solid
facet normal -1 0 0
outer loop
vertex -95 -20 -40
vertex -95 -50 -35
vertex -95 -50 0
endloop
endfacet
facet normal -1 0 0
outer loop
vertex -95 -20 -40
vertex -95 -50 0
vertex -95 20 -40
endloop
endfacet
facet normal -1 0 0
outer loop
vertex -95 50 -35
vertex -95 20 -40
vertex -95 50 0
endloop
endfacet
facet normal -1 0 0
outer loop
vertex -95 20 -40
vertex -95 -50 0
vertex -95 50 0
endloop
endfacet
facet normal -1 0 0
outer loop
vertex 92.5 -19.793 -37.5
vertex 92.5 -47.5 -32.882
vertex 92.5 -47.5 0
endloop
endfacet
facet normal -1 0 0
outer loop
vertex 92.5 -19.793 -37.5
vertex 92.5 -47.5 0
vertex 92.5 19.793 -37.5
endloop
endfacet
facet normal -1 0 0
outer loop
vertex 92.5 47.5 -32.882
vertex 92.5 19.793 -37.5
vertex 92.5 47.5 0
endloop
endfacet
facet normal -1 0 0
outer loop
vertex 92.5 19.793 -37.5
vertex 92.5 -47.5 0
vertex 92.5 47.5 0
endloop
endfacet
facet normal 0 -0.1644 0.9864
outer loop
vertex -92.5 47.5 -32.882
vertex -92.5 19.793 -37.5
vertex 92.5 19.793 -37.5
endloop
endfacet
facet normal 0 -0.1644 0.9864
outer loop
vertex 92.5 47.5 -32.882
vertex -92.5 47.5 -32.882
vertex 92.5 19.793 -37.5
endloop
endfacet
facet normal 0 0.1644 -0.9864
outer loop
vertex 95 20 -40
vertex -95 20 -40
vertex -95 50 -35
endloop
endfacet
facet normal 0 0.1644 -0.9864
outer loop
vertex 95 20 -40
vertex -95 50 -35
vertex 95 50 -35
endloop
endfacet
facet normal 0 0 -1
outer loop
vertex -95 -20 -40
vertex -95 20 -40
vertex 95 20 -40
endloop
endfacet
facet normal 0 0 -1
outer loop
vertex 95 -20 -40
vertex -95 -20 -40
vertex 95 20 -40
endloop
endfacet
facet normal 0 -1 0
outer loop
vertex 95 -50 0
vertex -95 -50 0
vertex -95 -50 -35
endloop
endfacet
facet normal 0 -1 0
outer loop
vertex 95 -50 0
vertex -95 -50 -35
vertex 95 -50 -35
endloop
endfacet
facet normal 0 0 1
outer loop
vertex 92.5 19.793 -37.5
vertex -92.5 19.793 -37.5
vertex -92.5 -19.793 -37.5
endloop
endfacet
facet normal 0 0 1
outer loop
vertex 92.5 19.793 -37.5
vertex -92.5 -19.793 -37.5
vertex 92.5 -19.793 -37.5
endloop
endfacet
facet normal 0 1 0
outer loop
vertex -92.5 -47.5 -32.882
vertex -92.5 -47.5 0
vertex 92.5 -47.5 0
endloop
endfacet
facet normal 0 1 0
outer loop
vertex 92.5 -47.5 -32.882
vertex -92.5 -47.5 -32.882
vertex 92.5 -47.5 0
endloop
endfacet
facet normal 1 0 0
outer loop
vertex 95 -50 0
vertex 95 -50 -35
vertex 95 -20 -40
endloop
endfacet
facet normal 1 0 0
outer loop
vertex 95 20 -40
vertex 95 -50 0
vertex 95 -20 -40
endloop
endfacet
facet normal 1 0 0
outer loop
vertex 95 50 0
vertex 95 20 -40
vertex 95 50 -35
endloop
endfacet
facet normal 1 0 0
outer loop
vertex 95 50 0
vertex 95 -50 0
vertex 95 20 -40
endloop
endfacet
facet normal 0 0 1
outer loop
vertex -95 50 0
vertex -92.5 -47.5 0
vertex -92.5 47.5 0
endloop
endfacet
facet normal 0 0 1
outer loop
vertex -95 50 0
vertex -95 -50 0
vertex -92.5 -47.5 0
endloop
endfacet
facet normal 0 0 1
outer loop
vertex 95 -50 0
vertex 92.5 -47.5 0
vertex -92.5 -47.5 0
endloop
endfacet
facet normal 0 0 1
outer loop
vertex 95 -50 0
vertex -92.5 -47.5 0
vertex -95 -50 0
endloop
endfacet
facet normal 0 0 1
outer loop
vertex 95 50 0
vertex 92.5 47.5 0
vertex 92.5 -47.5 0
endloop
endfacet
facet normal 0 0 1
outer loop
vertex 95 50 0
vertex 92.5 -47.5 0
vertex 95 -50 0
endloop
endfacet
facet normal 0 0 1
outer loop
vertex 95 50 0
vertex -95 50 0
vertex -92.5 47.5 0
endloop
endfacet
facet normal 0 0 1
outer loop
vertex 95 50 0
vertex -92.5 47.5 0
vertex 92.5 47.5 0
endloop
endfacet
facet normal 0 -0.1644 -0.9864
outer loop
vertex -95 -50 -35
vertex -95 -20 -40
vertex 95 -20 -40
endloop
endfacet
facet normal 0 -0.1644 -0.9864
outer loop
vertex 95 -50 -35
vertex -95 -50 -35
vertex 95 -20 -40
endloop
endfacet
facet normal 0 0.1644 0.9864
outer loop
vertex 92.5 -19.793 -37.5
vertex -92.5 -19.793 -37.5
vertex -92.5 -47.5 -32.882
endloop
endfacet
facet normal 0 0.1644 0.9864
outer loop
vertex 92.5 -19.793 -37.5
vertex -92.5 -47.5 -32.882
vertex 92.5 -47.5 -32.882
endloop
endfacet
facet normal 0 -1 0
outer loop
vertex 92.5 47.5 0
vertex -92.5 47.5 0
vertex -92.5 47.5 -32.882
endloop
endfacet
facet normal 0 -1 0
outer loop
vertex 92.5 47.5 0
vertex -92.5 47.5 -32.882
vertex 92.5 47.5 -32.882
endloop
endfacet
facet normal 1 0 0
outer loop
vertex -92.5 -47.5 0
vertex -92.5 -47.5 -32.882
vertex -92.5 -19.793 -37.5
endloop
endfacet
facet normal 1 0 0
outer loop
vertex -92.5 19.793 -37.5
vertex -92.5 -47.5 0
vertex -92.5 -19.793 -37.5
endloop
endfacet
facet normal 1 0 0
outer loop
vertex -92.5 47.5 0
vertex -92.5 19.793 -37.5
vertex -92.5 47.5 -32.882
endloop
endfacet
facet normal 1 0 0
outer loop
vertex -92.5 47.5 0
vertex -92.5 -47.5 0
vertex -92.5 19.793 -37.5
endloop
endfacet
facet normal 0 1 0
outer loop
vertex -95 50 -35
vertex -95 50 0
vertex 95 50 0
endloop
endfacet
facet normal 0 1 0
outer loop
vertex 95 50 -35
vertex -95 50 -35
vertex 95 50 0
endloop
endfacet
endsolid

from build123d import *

# Parameters (mm, degrees)
F0_W     = 190
F0_H     = 100
F1_DEPTH = 40
F2_SIZE2 = 30
F2_SIZE  = 5
F3_T     = -2.5


with BuildPart() as f1:
    # F0 (on Top) → F1 (new body)
    with BuildSketch(Plane.XY):
        Rectangle(F0_W, F0_H)
    extrude(amount=-F1_DEPTH)

    # F2
    f2_edges = [f1.edges().sort_by_distance(p)[0] for p in [
        (0, 50, -40),
        (0, -50, -40),
    ]]
    chamfer(f2_edges, length=F2_SIZE, length2=F2_SIZE2)

    # F3
    f3_openings = [f1.faces().sort_by_distance(p)[0] for p in [
        (0, 0, 0),
    ]]
    offset(amount=F3_T, openings=f3_openings)


solid = f1.part
